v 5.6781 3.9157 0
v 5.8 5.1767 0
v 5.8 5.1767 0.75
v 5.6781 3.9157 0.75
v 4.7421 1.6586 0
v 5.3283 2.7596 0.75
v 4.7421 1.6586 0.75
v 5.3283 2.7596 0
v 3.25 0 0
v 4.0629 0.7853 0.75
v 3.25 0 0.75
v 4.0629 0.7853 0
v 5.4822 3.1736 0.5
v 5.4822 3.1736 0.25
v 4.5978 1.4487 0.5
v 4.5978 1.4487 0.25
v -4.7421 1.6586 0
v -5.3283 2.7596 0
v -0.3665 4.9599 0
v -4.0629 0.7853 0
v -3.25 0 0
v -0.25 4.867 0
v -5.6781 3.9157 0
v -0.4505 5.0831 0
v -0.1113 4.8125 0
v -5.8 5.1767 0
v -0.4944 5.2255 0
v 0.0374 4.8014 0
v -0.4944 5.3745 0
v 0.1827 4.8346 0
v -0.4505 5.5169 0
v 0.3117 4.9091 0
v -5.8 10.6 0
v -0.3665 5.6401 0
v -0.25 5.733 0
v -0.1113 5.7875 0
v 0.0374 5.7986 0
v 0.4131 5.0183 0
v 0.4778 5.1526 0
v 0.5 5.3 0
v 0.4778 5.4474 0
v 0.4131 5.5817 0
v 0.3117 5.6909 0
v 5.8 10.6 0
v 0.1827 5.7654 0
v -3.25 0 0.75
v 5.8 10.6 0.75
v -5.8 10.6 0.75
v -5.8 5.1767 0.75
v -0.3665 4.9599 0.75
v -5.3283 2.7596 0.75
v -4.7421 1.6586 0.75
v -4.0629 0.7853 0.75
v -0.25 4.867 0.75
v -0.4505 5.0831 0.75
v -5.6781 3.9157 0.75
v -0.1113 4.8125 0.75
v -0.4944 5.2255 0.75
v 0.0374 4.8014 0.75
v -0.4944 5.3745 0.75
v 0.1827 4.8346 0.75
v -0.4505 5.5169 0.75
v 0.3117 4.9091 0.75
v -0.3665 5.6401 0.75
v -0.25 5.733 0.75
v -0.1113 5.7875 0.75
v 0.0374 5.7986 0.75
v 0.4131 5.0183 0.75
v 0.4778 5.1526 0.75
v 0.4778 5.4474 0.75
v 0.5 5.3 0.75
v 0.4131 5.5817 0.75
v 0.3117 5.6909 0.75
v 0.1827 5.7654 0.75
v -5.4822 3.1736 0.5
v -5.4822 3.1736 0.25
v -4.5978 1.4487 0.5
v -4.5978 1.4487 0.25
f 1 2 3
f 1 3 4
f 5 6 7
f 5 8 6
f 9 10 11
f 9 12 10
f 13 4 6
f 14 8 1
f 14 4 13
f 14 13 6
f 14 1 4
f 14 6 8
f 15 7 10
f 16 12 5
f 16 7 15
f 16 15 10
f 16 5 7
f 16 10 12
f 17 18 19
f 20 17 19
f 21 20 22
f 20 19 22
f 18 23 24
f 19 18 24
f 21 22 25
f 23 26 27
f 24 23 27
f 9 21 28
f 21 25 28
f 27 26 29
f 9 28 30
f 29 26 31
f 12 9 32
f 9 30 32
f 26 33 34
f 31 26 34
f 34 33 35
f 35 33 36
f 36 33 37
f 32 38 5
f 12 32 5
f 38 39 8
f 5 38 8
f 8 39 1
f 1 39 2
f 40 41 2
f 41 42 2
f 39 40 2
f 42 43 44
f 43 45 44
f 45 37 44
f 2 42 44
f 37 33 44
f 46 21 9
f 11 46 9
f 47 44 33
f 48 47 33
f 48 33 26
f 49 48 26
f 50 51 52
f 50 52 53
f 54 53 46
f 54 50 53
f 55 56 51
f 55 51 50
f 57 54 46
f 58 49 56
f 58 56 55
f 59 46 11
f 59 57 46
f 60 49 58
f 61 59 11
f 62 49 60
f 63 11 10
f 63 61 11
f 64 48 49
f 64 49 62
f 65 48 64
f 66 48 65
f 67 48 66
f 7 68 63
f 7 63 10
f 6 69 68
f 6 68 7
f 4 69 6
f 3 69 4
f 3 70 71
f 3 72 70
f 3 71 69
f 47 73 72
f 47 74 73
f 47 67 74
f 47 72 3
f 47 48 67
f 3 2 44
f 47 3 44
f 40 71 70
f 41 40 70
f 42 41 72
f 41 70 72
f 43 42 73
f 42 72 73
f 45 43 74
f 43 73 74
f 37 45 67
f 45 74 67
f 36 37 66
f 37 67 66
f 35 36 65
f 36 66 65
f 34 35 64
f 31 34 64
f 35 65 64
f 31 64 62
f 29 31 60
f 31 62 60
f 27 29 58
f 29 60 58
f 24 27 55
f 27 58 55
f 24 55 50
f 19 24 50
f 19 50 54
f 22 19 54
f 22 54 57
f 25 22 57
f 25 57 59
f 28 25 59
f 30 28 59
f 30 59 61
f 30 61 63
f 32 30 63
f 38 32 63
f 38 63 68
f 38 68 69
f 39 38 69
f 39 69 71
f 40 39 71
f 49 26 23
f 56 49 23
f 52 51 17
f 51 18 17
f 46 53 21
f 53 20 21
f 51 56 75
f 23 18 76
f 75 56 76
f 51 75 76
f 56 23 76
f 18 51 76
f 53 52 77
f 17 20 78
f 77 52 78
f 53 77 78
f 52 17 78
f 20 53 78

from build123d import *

# Parameters (mm, degrees)
BOSS_EXTRUDE1_DEPTH = 0.75
CUT_EXTRUDE1_REACH  = 14.106
SKETCH2_R           = 0.5


with BuildPart() as part:
    # Sketch1 → Boss-Extrude1 (new body)
    with BuildSketch(Plane.XY):
        with BuildLine():
            Line((-3.25, 0), (3.25, 0))
            add(Edge.make_bspline(
                [(5.8, 5.176744099), (5.8, 3.033630296), (4.795112478, 1.311398784), (3.25, 0)],
                knots=[0, 0, 0, 0, 1, 1, 1, 1], degree=3))
            Line((5.8, 5.176744099), (5.8, 10.6))
            Line((5.8, 10.6), (-5.8, 10.6))
            Line((-5.8, 10.6), (-5.8, 5.176744099))
            add(Edge.make_bspline(
                [(-5.8, 5.176744099), (-5.8, 3.033630296), (-4.795112478, 1.311398784), (-3.25, 0)],
                knots=[0, 0, 0, 0, 1, 1, 1, 1], degree=3))
        make_face()
    extrude(amount=BOSS_EXTRUDE1_DEPTH)

    # Sketch2 → Cut-Extrude1 (cut, up to next)
    with BuildSketch(Plane.XY.offset(0.75), mode=Mode.PRIVATE) as cut_extrude1_sk1:
        with Locations((0, 5.3)):
            Circle(SKETCH2_R)
    cut_extrude1_tool1 = extrude(cut_extrude1_sk1.sketch, amount=-CUT_EXTRUDE1_REACH, mode=Mode.PRIVATE) & part.part
    add(cut_extrude1_tool1.solids().sort_by_distance((0, 5.3, 0.75))[0], mode=Mode.SUBTRACT)


solid = part.part
